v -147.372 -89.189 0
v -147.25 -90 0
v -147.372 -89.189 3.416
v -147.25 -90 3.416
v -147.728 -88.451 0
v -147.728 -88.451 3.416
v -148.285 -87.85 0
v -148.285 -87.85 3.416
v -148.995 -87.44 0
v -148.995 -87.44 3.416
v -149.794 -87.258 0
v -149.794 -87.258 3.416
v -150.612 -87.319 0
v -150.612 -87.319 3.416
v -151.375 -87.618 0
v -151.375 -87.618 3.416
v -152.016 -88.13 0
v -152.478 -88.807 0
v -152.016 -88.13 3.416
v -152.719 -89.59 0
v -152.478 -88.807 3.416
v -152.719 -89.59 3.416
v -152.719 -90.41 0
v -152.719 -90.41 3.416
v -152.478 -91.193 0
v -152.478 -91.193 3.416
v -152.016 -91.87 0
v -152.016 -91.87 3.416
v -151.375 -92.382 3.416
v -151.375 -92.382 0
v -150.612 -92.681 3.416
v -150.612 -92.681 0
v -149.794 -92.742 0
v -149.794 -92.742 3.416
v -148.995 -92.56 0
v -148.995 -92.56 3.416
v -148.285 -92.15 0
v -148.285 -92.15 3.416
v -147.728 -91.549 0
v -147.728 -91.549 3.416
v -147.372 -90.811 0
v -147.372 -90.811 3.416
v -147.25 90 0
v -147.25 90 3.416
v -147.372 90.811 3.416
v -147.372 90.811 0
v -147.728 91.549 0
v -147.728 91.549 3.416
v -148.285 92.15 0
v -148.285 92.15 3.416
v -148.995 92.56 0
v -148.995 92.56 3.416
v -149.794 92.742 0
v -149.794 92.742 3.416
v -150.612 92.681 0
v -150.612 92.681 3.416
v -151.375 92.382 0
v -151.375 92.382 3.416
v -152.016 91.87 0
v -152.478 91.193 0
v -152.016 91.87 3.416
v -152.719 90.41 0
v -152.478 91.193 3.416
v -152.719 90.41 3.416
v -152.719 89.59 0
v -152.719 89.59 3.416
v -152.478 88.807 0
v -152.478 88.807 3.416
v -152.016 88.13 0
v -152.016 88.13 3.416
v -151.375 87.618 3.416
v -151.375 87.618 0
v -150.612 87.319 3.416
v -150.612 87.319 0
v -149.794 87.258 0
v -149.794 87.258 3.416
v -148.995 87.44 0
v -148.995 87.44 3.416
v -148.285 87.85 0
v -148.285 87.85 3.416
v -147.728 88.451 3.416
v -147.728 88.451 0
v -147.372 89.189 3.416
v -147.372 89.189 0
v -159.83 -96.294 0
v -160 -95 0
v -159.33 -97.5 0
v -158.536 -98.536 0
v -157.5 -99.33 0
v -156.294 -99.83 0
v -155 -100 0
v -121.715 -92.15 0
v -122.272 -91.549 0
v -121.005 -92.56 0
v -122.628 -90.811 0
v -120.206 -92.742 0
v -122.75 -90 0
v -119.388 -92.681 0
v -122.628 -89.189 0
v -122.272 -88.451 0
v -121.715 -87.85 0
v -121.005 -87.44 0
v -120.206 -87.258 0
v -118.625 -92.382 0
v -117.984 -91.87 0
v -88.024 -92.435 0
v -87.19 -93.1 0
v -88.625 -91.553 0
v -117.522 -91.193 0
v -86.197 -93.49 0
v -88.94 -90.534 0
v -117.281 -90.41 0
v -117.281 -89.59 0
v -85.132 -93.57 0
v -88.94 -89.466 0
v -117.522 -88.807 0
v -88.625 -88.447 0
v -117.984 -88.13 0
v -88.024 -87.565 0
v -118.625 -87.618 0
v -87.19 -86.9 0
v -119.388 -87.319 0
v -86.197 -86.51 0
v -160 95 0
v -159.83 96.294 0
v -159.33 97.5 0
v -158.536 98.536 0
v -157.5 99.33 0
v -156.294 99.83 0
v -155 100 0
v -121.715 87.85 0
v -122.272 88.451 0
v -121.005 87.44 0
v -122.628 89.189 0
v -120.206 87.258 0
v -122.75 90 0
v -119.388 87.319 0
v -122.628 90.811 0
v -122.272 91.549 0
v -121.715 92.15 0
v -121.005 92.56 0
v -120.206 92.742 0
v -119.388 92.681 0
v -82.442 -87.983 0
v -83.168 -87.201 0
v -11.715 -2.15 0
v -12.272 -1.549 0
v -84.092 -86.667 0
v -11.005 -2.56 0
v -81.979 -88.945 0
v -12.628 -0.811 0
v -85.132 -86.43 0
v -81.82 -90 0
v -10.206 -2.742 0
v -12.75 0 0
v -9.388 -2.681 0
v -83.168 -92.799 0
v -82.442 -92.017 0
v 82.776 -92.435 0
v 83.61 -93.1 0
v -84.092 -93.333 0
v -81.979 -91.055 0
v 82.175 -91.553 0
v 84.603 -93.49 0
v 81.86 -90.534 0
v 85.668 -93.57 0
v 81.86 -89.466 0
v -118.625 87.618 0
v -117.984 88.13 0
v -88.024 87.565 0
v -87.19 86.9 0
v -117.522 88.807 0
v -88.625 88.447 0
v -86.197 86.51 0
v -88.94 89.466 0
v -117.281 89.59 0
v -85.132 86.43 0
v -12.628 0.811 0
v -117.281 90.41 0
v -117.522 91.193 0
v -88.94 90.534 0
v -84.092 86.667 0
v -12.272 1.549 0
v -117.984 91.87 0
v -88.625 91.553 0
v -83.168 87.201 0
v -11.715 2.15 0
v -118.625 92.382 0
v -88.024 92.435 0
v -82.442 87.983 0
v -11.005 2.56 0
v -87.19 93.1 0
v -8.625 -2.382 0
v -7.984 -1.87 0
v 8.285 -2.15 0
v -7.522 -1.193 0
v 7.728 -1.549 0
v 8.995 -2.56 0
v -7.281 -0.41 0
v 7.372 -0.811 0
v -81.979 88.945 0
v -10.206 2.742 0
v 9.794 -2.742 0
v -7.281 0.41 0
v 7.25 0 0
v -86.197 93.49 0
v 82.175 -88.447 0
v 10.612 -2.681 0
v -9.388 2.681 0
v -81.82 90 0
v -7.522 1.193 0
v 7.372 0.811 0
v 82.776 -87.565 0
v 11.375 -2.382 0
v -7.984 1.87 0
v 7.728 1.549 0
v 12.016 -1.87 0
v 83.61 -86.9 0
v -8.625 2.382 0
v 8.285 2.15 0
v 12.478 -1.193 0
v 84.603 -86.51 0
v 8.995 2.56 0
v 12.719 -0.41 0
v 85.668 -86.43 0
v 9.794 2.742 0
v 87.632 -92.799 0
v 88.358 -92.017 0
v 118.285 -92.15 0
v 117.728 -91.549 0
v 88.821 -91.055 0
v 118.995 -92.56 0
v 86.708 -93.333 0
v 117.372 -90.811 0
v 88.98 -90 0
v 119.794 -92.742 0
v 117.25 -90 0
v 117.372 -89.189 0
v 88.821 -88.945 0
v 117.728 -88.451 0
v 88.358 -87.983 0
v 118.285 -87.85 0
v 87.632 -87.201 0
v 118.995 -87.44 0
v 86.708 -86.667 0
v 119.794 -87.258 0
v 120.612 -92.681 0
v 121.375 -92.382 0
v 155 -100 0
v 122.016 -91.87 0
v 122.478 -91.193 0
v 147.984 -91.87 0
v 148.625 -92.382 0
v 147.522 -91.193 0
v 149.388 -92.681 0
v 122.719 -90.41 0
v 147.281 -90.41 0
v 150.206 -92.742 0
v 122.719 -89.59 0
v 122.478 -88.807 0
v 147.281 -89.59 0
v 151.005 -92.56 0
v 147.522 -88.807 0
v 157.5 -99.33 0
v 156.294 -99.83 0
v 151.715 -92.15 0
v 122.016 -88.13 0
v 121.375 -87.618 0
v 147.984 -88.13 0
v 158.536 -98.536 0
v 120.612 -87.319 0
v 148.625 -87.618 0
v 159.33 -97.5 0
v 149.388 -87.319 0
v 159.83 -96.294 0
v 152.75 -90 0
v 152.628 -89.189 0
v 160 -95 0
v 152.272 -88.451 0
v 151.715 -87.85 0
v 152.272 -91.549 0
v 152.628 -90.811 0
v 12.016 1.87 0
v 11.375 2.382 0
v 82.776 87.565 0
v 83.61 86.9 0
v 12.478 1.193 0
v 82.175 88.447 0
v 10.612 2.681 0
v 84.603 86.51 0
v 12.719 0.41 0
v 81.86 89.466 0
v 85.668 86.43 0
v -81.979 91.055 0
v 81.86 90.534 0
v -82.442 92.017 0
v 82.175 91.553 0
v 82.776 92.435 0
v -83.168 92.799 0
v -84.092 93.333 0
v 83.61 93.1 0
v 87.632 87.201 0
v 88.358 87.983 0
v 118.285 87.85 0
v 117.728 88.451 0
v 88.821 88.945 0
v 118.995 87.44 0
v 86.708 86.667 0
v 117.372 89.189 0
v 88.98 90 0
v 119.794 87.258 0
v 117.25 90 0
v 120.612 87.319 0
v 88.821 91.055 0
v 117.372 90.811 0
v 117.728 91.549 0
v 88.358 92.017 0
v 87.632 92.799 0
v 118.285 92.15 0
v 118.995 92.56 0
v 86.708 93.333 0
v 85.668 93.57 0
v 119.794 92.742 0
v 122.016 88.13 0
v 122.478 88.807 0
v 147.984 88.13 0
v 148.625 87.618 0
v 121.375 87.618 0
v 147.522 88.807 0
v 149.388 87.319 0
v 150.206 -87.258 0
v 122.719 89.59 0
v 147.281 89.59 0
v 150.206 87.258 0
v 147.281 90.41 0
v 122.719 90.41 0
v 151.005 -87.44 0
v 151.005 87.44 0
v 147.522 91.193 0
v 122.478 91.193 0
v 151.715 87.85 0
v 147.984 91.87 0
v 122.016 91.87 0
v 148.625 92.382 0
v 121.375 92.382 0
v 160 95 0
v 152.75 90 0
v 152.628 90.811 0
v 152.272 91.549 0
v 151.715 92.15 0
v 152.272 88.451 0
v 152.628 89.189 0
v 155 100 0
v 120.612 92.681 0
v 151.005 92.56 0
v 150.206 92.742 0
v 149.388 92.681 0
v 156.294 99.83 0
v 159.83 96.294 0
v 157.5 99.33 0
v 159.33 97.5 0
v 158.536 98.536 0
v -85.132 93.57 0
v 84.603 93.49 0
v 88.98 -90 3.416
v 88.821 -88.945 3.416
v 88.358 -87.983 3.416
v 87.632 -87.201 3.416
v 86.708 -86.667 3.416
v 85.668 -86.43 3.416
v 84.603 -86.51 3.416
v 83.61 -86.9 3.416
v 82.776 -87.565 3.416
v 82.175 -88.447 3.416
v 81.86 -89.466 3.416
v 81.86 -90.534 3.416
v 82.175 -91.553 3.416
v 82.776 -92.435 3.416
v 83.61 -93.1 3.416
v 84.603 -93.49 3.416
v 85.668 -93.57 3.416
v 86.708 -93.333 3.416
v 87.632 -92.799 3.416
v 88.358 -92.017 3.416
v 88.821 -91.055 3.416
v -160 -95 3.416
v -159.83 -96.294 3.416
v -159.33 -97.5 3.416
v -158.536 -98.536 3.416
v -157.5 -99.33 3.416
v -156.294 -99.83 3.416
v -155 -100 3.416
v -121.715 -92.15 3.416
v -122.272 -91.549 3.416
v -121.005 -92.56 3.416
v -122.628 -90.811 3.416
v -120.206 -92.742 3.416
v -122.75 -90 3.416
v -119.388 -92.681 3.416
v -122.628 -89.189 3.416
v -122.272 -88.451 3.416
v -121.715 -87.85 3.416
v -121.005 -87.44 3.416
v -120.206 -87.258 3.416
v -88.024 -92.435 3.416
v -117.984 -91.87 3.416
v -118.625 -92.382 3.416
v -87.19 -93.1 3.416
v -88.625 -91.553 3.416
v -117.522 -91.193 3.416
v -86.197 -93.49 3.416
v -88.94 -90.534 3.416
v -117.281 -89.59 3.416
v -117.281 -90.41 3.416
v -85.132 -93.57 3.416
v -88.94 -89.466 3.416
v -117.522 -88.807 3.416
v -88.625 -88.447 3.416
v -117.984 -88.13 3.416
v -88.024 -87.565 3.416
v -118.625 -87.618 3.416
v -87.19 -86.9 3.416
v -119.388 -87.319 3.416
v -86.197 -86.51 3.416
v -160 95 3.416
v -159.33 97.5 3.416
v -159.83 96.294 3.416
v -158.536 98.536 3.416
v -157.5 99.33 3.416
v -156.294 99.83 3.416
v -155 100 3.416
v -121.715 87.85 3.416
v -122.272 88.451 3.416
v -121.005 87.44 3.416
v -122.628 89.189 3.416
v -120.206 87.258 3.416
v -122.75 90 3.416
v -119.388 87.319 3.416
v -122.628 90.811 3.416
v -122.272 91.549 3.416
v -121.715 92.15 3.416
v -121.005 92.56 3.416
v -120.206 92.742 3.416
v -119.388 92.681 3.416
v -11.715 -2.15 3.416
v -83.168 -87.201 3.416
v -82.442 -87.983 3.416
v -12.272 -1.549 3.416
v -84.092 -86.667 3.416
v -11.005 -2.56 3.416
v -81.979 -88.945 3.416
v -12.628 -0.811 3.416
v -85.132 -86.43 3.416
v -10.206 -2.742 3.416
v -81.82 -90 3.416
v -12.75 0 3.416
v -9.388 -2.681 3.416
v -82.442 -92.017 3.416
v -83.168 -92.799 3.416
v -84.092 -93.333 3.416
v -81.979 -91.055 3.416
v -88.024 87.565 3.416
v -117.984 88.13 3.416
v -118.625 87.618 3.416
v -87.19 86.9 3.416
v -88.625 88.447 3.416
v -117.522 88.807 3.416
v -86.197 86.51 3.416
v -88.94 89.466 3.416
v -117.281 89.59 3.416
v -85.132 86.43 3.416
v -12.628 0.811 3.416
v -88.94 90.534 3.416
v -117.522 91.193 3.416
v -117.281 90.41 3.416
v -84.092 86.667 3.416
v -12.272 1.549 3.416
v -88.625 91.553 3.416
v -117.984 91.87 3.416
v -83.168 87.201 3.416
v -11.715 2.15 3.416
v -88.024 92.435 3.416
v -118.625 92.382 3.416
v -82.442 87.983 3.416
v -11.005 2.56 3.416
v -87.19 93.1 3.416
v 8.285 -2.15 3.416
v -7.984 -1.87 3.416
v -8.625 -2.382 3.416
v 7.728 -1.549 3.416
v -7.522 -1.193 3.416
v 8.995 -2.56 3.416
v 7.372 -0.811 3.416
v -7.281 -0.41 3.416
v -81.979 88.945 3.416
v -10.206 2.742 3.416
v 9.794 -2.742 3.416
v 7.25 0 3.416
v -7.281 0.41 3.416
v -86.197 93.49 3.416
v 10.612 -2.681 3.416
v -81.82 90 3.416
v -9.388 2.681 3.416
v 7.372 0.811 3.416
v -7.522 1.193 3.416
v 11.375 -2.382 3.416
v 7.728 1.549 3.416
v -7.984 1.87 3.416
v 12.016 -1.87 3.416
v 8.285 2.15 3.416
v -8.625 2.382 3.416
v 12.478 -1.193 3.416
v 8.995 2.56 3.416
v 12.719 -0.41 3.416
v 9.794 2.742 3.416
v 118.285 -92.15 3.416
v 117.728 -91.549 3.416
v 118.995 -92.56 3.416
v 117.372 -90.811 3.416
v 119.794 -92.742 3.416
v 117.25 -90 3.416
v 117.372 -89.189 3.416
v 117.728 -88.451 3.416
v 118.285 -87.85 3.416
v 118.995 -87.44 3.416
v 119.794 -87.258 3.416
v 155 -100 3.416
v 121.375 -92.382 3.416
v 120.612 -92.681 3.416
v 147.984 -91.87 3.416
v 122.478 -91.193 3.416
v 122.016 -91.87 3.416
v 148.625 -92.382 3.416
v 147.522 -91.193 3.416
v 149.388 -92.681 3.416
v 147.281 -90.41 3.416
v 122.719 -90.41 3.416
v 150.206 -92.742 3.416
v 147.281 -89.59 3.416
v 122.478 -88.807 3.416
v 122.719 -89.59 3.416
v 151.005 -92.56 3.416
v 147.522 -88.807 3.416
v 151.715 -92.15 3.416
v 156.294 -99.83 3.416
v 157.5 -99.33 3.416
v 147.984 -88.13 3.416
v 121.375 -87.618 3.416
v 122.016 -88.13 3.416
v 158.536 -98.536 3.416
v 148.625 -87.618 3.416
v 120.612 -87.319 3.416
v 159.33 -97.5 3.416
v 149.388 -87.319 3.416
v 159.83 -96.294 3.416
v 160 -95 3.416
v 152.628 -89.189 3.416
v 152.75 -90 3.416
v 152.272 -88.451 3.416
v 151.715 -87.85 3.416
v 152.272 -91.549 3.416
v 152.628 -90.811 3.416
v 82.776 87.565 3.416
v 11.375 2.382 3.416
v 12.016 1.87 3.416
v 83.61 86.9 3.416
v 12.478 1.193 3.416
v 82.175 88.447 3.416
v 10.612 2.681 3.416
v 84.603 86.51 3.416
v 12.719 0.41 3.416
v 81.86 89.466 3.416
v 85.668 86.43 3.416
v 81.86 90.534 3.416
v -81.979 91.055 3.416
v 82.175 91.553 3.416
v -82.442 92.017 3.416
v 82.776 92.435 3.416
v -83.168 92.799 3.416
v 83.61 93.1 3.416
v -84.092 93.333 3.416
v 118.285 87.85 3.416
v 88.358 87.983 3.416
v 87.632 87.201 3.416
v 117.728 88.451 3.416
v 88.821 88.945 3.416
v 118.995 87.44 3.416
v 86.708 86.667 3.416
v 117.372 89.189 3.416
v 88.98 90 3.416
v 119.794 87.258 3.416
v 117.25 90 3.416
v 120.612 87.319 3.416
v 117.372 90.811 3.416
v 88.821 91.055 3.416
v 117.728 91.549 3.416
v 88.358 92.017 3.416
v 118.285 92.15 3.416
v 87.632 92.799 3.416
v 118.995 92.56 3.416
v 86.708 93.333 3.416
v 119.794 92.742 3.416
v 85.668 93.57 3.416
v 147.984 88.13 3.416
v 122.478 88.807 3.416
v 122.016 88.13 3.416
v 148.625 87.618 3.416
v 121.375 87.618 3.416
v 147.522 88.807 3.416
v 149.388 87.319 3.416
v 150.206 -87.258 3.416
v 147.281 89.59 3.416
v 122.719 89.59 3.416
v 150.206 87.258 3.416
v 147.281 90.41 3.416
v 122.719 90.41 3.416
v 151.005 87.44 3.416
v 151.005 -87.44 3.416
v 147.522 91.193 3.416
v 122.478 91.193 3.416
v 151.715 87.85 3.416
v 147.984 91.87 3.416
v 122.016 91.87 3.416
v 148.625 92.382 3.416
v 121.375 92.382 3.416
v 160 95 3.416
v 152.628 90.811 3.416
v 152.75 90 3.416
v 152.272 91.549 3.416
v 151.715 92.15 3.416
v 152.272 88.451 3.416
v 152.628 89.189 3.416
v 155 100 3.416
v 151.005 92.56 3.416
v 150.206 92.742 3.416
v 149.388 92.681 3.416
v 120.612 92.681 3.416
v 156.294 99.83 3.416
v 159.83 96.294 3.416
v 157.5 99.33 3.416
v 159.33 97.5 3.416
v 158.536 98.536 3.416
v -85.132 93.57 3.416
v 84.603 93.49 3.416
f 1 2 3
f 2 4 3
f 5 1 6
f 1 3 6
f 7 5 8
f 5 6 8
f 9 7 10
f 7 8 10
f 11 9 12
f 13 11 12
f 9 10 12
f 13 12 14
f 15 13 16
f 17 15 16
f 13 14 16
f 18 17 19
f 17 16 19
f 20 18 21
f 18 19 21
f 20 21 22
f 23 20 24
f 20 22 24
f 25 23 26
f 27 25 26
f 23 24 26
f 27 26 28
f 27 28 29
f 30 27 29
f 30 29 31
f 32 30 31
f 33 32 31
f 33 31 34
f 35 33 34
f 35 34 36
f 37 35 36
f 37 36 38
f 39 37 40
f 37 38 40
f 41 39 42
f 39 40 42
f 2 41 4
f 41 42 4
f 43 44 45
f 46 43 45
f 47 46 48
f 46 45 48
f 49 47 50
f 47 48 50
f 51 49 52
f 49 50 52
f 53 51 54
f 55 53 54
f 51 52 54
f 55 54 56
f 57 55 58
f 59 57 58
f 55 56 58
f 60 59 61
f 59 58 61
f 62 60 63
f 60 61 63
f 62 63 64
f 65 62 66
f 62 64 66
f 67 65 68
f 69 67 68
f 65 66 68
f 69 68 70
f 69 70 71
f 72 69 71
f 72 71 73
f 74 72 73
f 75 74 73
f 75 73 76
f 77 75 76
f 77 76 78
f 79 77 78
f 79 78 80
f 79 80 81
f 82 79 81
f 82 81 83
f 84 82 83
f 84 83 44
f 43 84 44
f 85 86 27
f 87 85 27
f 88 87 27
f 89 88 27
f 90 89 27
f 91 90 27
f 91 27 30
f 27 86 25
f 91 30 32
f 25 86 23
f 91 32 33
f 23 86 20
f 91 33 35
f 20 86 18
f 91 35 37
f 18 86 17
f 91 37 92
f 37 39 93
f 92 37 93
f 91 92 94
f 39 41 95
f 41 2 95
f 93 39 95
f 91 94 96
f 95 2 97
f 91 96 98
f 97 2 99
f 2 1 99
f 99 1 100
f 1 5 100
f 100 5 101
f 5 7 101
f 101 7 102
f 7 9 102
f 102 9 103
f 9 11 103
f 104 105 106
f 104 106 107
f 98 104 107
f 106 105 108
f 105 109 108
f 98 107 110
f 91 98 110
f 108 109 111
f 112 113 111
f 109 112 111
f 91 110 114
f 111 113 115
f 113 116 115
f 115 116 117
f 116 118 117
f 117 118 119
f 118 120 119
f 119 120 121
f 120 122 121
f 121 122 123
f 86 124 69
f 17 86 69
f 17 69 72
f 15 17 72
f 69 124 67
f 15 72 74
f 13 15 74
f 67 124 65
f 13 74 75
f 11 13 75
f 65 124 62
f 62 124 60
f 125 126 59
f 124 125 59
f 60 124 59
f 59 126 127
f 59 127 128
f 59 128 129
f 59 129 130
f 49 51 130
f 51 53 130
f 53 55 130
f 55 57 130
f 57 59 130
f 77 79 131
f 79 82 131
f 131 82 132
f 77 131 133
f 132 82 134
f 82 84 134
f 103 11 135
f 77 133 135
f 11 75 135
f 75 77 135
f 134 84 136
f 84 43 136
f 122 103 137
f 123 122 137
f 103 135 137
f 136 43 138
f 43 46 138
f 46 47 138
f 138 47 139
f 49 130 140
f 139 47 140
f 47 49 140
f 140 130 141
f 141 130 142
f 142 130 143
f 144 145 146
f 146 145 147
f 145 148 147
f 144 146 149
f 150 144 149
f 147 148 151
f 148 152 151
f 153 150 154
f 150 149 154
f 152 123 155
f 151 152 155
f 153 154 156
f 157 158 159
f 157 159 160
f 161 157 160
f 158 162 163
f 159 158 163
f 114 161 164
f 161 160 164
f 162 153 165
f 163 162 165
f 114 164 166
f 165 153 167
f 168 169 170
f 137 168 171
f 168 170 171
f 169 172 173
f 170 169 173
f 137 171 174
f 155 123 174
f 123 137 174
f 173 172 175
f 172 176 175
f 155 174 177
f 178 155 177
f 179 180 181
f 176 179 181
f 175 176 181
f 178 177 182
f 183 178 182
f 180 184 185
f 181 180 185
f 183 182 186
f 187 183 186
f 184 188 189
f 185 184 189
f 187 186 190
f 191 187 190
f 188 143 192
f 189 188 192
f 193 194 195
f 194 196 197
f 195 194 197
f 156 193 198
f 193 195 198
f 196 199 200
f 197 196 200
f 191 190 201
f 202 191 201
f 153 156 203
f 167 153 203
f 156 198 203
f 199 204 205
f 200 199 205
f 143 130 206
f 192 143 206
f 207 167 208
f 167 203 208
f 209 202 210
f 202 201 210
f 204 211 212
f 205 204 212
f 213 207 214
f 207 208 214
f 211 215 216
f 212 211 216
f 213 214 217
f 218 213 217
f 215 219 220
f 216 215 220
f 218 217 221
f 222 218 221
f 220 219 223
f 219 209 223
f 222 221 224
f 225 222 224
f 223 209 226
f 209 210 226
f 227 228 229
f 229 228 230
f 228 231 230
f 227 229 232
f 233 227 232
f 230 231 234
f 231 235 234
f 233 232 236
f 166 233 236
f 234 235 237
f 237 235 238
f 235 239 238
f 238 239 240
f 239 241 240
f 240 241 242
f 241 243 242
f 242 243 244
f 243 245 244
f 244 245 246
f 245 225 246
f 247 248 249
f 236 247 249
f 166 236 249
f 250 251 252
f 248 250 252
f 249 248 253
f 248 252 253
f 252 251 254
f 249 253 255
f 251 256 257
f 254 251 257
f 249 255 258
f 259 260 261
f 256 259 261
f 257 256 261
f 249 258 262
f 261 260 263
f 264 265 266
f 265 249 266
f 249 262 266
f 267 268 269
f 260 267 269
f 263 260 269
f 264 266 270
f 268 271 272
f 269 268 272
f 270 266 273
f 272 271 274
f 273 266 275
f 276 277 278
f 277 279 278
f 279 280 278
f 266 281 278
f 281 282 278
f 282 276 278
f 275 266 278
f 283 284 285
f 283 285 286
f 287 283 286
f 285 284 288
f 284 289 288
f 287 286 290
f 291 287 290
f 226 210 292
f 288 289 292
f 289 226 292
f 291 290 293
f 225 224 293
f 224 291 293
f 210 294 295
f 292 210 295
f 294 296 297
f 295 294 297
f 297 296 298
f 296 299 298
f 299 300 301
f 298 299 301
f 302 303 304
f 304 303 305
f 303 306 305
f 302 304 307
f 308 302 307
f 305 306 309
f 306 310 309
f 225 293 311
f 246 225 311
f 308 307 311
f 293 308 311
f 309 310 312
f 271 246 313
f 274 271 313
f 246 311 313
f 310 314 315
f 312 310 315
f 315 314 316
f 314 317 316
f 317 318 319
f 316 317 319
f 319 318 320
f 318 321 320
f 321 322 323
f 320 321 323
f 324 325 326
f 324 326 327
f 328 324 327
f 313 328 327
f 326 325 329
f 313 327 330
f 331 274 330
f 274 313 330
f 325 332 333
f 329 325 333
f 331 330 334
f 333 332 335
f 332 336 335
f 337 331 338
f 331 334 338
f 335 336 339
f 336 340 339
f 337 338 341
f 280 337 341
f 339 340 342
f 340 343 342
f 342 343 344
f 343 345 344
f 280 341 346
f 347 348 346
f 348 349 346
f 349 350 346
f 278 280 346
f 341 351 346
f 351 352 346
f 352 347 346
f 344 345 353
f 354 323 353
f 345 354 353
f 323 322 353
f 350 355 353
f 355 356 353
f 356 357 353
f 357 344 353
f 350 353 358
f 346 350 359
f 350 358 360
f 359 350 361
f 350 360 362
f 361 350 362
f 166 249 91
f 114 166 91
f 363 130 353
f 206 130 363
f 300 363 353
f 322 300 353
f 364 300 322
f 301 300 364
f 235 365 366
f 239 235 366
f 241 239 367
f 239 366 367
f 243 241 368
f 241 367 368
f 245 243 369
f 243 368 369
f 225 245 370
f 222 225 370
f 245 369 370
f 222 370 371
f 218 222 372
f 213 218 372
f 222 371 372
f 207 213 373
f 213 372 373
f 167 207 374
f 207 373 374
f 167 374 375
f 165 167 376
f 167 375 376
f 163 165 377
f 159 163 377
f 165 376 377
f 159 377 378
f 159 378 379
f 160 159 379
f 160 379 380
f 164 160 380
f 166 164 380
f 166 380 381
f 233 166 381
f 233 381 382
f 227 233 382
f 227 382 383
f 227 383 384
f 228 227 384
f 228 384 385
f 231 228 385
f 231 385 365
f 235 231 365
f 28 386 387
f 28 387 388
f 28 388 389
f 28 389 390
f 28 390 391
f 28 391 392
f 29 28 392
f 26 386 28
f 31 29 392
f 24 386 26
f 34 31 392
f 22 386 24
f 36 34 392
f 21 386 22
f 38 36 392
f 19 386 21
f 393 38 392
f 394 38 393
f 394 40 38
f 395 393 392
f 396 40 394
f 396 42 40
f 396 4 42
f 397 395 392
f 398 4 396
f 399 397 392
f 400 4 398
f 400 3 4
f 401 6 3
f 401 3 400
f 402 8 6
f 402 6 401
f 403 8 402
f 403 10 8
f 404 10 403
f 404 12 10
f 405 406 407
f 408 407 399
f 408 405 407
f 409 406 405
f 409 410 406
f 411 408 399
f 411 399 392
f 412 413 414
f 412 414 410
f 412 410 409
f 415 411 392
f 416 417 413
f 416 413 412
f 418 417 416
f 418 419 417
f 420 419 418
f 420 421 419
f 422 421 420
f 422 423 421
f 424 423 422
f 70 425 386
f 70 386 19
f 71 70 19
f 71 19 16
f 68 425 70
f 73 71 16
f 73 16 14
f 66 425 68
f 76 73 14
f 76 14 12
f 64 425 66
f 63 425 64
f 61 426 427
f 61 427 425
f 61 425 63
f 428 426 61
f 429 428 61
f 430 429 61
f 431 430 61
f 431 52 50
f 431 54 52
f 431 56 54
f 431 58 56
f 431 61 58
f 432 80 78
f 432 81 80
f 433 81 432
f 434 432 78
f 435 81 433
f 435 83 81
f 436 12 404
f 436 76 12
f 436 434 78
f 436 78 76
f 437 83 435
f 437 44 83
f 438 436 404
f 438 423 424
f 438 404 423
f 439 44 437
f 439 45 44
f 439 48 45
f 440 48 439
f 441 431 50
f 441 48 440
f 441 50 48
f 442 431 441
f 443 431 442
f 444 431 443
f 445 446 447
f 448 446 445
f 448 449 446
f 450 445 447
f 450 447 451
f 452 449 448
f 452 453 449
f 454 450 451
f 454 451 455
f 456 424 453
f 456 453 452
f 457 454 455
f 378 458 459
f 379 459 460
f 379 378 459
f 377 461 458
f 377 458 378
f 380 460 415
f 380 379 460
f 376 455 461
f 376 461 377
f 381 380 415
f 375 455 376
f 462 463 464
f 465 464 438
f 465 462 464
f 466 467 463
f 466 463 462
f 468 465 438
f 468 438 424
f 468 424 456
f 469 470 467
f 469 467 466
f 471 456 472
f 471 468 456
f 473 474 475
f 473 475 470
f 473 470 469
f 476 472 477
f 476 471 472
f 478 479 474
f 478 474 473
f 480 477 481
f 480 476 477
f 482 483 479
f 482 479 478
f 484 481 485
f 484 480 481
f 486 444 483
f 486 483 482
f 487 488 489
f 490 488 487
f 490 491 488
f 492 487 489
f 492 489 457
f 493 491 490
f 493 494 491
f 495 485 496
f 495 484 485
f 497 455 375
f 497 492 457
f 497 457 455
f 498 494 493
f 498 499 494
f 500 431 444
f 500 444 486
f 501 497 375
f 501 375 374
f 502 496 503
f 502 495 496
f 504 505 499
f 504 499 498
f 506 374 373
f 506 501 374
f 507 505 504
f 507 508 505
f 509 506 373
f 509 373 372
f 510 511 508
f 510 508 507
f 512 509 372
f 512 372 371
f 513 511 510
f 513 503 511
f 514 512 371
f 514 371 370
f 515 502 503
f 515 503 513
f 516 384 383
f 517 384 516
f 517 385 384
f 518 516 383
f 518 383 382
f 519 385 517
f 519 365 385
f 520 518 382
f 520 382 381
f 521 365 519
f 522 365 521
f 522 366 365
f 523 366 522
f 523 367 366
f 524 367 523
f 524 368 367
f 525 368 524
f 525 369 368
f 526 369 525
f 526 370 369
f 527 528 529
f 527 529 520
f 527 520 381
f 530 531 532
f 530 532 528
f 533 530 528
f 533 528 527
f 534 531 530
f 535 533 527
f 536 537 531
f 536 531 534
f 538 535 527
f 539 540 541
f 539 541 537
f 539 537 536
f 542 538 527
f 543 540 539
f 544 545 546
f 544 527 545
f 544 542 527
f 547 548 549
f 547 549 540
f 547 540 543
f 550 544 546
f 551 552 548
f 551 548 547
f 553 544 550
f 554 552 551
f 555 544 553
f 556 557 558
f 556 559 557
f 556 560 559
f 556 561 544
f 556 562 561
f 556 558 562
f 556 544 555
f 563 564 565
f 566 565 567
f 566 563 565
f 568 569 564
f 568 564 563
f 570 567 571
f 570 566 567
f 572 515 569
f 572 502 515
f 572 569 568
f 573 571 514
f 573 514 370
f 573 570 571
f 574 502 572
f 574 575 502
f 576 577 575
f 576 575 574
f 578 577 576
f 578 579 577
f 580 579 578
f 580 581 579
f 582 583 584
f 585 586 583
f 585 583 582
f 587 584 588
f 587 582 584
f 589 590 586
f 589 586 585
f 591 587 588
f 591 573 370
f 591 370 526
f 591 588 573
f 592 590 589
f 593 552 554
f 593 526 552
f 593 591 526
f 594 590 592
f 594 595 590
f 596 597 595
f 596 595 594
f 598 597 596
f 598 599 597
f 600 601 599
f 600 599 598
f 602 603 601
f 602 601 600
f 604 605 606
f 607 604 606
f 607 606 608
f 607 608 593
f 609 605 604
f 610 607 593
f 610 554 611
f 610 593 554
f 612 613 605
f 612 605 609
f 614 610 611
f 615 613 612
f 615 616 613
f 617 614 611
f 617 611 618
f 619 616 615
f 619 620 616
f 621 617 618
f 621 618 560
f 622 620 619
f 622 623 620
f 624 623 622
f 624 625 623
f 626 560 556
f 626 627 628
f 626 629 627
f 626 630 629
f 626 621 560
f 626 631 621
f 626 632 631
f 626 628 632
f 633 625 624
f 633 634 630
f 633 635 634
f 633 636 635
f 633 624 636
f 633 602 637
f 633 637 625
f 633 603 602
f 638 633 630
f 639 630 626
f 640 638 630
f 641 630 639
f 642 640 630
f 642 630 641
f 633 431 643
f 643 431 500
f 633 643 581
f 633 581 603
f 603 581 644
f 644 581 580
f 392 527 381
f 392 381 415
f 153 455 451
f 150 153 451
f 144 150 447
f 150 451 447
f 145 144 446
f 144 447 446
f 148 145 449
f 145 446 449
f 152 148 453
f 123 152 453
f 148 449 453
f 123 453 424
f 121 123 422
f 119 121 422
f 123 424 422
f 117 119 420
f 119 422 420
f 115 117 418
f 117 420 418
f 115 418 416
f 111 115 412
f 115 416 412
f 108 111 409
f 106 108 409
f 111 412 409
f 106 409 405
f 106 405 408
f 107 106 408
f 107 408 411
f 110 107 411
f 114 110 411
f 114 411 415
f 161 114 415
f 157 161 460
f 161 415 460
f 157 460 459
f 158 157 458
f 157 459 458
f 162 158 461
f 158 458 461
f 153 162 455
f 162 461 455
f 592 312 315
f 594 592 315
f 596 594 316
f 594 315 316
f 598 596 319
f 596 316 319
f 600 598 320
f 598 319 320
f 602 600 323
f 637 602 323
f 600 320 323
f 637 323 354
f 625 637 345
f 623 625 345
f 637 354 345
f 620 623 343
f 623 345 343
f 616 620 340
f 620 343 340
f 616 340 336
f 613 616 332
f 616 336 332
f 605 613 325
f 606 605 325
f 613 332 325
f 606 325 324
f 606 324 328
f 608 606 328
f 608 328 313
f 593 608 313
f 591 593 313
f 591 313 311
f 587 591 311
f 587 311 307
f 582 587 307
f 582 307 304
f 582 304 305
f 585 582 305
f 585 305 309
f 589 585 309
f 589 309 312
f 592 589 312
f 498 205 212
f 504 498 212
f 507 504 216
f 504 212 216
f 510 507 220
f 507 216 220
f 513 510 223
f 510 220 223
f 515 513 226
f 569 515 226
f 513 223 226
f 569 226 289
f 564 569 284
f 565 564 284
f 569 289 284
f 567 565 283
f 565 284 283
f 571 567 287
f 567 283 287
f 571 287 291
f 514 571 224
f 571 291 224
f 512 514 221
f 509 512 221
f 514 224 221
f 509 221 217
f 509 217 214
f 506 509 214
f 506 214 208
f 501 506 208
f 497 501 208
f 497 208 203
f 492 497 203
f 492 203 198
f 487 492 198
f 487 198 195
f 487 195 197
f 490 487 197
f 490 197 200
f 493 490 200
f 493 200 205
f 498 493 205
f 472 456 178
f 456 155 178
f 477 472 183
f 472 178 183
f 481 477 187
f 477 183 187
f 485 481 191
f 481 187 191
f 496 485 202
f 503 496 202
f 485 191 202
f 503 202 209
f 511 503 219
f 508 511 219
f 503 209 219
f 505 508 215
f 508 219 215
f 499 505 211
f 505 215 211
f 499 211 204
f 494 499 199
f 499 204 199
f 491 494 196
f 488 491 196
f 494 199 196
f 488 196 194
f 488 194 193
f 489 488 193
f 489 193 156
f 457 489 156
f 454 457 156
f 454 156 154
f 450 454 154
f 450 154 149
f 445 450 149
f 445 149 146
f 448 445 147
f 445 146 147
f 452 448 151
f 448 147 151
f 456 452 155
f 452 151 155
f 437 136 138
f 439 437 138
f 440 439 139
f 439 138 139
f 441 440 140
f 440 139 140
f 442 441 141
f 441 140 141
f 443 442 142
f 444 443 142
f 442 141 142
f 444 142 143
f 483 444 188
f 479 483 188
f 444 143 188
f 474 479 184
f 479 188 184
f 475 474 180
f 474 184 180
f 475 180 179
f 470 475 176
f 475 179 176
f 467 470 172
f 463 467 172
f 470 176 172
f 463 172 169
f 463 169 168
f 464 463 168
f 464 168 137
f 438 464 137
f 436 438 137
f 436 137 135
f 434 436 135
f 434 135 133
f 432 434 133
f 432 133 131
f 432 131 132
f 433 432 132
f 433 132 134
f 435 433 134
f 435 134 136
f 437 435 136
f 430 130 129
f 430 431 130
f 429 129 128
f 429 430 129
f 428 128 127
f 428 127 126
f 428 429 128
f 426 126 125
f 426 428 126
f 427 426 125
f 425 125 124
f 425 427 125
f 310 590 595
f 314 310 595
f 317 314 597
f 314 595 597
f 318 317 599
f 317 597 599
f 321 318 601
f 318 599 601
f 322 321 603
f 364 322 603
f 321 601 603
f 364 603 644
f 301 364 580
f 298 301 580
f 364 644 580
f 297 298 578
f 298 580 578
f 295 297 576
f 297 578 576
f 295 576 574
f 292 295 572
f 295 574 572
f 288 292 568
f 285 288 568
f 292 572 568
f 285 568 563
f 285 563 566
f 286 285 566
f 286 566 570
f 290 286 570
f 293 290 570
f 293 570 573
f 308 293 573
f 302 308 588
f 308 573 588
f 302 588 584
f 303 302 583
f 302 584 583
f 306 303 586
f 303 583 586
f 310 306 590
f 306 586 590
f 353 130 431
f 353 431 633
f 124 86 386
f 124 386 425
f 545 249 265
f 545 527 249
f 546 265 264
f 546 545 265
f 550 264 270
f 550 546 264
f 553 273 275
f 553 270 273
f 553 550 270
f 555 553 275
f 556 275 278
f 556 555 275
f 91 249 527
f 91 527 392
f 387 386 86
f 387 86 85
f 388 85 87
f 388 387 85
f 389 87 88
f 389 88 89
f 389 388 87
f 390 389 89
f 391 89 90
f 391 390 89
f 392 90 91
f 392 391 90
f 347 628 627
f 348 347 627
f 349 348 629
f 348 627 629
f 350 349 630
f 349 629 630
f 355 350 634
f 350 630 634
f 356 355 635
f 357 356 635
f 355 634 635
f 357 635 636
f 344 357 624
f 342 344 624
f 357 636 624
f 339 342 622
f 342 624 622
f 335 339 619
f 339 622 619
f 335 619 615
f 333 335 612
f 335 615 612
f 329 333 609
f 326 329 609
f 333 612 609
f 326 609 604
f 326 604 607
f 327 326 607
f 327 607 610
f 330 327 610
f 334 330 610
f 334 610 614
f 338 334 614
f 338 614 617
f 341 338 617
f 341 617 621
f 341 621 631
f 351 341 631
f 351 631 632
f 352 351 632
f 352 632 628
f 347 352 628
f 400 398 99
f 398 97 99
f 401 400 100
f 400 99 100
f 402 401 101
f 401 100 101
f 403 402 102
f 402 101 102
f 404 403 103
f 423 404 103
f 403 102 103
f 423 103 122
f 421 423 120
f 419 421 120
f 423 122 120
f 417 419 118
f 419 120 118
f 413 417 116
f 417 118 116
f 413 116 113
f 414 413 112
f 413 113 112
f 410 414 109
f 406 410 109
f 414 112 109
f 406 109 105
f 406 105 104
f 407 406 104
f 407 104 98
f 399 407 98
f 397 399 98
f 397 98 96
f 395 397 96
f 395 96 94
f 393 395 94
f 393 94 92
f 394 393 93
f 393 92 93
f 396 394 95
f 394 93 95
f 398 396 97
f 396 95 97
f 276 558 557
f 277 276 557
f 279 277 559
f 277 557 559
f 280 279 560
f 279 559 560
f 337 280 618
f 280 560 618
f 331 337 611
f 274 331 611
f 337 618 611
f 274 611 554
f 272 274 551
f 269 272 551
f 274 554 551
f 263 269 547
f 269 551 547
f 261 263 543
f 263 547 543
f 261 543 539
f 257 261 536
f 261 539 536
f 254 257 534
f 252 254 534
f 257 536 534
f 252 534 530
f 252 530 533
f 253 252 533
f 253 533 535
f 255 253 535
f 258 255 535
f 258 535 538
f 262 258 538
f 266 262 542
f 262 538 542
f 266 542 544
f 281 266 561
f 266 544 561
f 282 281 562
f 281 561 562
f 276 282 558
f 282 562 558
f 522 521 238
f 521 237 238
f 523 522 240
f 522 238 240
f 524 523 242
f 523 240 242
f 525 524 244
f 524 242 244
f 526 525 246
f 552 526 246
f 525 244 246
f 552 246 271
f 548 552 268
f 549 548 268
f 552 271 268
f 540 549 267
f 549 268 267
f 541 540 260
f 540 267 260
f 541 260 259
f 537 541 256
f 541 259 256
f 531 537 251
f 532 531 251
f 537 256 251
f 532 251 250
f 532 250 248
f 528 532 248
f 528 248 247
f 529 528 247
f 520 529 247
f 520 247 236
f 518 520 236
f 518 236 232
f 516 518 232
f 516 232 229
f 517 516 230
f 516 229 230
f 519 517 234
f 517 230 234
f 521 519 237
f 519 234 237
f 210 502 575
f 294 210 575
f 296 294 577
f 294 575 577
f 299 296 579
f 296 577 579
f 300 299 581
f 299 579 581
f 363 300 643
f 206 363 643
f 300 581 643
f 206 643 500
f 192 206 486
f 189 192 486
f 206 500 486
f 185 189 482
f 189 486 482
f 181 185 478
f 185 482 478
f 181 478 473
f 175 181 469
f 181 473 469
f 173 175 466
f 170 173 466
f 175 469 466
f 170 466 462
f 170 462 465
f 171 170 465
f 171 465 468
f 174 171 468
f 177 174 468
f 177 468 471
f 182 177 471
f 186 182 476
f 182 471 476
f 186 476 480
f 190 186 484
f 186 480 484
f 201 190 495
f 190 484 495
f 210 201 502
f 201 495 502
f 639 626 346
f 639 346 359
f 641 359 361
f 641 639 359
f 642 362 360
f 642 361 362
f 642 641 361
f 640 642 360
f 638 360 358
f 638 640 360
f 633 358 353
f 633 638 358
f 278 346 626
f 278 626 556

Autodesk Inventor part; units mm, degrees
ref_plane "YZ Plane" through (0, 0, 0) normal (1, 0, 0) x (0, 1, 0)
ref_plane "XZ Plane" through (0, 0, 0) normal (0, 1, 0) x (-1, 0, 0)
ref_plane "XY Plane" through (0, 0, 0) normal (0, 0, 1) x (1, 0, 0)
sketch "Sketch1" plane through (0, 0, 0) normal (0, 0, 1) x (1, 0, 0)
  line L0 (-160, 100) -> (160, 100)
  line L1 (160, 100) -> (160, -100)
  line L2 (160, -100) -> (-160, -100)
  line L3 (-160, -100) -> (-160, 100)
  point P0 (0, 0)
  dimension "d0" = 320
  dimension "d1" = 200
  dimension "d2" = 160
  dimension "d3" = 100
extrude "Extrusion1" add sketch "Sketch1" along normal blind 3.4163
sketch "Sketch2" plane through (0, 0, 3.4163) normal (0, 0, 1) x (1, 0, 0)
  line L0 (160, 100) -> (-160, 100) projected
  line L1 (-160, 100) -> (-160, -100) projected
  line L2 (-160, -100) -> (160, -100) projected
  line L3 (160, -100) -> (160, 100) projected
  circle A0 centre (-150, -90) radius 2.75
  circle A1 centre (-150, 90) radius 2.75
  circle A2 centre (-85.4, 90) radius 3.58
  circle A3 centre (-85.4, -90) radius 3.58
  circle A4 centre (85.4, 90) radius 3.58
  circle A5 centre (150, 90) radius 2.75
  circle A6 centre (85.4, -90) radius 3.58
  circle A7 centre (150, -90) radius 2.75
  point P0 (0, 0)
  dimension "d6" = 5.5
  dimension "d7" = 5.5
  dimension "d8" = 7.16
  dimension "d9" = 7.16
  dimension "d10" = 7.16
  dimension "d11" = 5.5
  dimension "d12" = 7.16
  dimension "d13" = 5.5
  dimension "d14" = 10
  dimension "d15" = 10
  dimension "d16" = 64.6
  dimension "d17" = 10
  dimension "d18" = 64.6
  dimension "d19" = 10
  dimension "d20" = 10
  dimension "d21" = 10
  dimension "d22" = 10
  dimension "d23" = 10
  dimension "d24" = 10
  dimension "d25" = 10
  dimension "d26" = 10
  dimension "d27" = 64.6
  dimension "d28" = 64.6
  dimension "d29" = 10
extrude "Extrusion2" cut sketch "Sketch2" against normal through all contours A0 | A1 | A2 | A3 | A4 | A5 | A6 | A7
fillet "Fillet1" radius 5 4 edges at (-160, -100, 1.7082) (-160, 100, 1.7082) (160, 100, 1.7082) (160, -100, 1.7082)
sketch "Sketch3" plane through (0, 0, 0) normal (0, 0, -1) x (-1, 0, 0)
  circle A0 centre (-10, 0) radius 2.067 projected
  circle A1 centre (10, 0) radius 2.067 projected
  circle A2 centre (-10, 0) radius 2.75
  circle A3 centre (10, 0) radius 2.75
  point P0 (0, 0)
  dimension "d33" = 5.5
  dimension "d34" = 5.5
extrude "Extrusion3" cut sketch "Sketch3" against normal through all contours A0 | A1 | A2 | A3
sketch "Sketch4" plane through (0, 0, 0) normal (0, 0, -1) x (-1, 0, 0)
  line L0 (-155, -100) -> (155, -100) projected
  line L1 (-160, 95) -> (-160, -95) projected
  circle A0 centre (-120, -90) radius 2.75
  point P0 (0, 0)
  dimension "d37" = 5.5
  dimension "d38" = 40
  dimension "d39" = 10
extrude "Extrusion4" cut sketch "Sketch4" against normal through all
pattern_linear "Rectangular Pattern1" count 2 spacing 240 along (-1, 0, 0) count 2 spacing 180 along (0, 1, 0) of "Extrusion4"
equation "\"d2\" = 0.5 * d0"
equation "\"d3\" = 0.5 * d1"
properties part number "y-carriage" material "Steel, Mild"
